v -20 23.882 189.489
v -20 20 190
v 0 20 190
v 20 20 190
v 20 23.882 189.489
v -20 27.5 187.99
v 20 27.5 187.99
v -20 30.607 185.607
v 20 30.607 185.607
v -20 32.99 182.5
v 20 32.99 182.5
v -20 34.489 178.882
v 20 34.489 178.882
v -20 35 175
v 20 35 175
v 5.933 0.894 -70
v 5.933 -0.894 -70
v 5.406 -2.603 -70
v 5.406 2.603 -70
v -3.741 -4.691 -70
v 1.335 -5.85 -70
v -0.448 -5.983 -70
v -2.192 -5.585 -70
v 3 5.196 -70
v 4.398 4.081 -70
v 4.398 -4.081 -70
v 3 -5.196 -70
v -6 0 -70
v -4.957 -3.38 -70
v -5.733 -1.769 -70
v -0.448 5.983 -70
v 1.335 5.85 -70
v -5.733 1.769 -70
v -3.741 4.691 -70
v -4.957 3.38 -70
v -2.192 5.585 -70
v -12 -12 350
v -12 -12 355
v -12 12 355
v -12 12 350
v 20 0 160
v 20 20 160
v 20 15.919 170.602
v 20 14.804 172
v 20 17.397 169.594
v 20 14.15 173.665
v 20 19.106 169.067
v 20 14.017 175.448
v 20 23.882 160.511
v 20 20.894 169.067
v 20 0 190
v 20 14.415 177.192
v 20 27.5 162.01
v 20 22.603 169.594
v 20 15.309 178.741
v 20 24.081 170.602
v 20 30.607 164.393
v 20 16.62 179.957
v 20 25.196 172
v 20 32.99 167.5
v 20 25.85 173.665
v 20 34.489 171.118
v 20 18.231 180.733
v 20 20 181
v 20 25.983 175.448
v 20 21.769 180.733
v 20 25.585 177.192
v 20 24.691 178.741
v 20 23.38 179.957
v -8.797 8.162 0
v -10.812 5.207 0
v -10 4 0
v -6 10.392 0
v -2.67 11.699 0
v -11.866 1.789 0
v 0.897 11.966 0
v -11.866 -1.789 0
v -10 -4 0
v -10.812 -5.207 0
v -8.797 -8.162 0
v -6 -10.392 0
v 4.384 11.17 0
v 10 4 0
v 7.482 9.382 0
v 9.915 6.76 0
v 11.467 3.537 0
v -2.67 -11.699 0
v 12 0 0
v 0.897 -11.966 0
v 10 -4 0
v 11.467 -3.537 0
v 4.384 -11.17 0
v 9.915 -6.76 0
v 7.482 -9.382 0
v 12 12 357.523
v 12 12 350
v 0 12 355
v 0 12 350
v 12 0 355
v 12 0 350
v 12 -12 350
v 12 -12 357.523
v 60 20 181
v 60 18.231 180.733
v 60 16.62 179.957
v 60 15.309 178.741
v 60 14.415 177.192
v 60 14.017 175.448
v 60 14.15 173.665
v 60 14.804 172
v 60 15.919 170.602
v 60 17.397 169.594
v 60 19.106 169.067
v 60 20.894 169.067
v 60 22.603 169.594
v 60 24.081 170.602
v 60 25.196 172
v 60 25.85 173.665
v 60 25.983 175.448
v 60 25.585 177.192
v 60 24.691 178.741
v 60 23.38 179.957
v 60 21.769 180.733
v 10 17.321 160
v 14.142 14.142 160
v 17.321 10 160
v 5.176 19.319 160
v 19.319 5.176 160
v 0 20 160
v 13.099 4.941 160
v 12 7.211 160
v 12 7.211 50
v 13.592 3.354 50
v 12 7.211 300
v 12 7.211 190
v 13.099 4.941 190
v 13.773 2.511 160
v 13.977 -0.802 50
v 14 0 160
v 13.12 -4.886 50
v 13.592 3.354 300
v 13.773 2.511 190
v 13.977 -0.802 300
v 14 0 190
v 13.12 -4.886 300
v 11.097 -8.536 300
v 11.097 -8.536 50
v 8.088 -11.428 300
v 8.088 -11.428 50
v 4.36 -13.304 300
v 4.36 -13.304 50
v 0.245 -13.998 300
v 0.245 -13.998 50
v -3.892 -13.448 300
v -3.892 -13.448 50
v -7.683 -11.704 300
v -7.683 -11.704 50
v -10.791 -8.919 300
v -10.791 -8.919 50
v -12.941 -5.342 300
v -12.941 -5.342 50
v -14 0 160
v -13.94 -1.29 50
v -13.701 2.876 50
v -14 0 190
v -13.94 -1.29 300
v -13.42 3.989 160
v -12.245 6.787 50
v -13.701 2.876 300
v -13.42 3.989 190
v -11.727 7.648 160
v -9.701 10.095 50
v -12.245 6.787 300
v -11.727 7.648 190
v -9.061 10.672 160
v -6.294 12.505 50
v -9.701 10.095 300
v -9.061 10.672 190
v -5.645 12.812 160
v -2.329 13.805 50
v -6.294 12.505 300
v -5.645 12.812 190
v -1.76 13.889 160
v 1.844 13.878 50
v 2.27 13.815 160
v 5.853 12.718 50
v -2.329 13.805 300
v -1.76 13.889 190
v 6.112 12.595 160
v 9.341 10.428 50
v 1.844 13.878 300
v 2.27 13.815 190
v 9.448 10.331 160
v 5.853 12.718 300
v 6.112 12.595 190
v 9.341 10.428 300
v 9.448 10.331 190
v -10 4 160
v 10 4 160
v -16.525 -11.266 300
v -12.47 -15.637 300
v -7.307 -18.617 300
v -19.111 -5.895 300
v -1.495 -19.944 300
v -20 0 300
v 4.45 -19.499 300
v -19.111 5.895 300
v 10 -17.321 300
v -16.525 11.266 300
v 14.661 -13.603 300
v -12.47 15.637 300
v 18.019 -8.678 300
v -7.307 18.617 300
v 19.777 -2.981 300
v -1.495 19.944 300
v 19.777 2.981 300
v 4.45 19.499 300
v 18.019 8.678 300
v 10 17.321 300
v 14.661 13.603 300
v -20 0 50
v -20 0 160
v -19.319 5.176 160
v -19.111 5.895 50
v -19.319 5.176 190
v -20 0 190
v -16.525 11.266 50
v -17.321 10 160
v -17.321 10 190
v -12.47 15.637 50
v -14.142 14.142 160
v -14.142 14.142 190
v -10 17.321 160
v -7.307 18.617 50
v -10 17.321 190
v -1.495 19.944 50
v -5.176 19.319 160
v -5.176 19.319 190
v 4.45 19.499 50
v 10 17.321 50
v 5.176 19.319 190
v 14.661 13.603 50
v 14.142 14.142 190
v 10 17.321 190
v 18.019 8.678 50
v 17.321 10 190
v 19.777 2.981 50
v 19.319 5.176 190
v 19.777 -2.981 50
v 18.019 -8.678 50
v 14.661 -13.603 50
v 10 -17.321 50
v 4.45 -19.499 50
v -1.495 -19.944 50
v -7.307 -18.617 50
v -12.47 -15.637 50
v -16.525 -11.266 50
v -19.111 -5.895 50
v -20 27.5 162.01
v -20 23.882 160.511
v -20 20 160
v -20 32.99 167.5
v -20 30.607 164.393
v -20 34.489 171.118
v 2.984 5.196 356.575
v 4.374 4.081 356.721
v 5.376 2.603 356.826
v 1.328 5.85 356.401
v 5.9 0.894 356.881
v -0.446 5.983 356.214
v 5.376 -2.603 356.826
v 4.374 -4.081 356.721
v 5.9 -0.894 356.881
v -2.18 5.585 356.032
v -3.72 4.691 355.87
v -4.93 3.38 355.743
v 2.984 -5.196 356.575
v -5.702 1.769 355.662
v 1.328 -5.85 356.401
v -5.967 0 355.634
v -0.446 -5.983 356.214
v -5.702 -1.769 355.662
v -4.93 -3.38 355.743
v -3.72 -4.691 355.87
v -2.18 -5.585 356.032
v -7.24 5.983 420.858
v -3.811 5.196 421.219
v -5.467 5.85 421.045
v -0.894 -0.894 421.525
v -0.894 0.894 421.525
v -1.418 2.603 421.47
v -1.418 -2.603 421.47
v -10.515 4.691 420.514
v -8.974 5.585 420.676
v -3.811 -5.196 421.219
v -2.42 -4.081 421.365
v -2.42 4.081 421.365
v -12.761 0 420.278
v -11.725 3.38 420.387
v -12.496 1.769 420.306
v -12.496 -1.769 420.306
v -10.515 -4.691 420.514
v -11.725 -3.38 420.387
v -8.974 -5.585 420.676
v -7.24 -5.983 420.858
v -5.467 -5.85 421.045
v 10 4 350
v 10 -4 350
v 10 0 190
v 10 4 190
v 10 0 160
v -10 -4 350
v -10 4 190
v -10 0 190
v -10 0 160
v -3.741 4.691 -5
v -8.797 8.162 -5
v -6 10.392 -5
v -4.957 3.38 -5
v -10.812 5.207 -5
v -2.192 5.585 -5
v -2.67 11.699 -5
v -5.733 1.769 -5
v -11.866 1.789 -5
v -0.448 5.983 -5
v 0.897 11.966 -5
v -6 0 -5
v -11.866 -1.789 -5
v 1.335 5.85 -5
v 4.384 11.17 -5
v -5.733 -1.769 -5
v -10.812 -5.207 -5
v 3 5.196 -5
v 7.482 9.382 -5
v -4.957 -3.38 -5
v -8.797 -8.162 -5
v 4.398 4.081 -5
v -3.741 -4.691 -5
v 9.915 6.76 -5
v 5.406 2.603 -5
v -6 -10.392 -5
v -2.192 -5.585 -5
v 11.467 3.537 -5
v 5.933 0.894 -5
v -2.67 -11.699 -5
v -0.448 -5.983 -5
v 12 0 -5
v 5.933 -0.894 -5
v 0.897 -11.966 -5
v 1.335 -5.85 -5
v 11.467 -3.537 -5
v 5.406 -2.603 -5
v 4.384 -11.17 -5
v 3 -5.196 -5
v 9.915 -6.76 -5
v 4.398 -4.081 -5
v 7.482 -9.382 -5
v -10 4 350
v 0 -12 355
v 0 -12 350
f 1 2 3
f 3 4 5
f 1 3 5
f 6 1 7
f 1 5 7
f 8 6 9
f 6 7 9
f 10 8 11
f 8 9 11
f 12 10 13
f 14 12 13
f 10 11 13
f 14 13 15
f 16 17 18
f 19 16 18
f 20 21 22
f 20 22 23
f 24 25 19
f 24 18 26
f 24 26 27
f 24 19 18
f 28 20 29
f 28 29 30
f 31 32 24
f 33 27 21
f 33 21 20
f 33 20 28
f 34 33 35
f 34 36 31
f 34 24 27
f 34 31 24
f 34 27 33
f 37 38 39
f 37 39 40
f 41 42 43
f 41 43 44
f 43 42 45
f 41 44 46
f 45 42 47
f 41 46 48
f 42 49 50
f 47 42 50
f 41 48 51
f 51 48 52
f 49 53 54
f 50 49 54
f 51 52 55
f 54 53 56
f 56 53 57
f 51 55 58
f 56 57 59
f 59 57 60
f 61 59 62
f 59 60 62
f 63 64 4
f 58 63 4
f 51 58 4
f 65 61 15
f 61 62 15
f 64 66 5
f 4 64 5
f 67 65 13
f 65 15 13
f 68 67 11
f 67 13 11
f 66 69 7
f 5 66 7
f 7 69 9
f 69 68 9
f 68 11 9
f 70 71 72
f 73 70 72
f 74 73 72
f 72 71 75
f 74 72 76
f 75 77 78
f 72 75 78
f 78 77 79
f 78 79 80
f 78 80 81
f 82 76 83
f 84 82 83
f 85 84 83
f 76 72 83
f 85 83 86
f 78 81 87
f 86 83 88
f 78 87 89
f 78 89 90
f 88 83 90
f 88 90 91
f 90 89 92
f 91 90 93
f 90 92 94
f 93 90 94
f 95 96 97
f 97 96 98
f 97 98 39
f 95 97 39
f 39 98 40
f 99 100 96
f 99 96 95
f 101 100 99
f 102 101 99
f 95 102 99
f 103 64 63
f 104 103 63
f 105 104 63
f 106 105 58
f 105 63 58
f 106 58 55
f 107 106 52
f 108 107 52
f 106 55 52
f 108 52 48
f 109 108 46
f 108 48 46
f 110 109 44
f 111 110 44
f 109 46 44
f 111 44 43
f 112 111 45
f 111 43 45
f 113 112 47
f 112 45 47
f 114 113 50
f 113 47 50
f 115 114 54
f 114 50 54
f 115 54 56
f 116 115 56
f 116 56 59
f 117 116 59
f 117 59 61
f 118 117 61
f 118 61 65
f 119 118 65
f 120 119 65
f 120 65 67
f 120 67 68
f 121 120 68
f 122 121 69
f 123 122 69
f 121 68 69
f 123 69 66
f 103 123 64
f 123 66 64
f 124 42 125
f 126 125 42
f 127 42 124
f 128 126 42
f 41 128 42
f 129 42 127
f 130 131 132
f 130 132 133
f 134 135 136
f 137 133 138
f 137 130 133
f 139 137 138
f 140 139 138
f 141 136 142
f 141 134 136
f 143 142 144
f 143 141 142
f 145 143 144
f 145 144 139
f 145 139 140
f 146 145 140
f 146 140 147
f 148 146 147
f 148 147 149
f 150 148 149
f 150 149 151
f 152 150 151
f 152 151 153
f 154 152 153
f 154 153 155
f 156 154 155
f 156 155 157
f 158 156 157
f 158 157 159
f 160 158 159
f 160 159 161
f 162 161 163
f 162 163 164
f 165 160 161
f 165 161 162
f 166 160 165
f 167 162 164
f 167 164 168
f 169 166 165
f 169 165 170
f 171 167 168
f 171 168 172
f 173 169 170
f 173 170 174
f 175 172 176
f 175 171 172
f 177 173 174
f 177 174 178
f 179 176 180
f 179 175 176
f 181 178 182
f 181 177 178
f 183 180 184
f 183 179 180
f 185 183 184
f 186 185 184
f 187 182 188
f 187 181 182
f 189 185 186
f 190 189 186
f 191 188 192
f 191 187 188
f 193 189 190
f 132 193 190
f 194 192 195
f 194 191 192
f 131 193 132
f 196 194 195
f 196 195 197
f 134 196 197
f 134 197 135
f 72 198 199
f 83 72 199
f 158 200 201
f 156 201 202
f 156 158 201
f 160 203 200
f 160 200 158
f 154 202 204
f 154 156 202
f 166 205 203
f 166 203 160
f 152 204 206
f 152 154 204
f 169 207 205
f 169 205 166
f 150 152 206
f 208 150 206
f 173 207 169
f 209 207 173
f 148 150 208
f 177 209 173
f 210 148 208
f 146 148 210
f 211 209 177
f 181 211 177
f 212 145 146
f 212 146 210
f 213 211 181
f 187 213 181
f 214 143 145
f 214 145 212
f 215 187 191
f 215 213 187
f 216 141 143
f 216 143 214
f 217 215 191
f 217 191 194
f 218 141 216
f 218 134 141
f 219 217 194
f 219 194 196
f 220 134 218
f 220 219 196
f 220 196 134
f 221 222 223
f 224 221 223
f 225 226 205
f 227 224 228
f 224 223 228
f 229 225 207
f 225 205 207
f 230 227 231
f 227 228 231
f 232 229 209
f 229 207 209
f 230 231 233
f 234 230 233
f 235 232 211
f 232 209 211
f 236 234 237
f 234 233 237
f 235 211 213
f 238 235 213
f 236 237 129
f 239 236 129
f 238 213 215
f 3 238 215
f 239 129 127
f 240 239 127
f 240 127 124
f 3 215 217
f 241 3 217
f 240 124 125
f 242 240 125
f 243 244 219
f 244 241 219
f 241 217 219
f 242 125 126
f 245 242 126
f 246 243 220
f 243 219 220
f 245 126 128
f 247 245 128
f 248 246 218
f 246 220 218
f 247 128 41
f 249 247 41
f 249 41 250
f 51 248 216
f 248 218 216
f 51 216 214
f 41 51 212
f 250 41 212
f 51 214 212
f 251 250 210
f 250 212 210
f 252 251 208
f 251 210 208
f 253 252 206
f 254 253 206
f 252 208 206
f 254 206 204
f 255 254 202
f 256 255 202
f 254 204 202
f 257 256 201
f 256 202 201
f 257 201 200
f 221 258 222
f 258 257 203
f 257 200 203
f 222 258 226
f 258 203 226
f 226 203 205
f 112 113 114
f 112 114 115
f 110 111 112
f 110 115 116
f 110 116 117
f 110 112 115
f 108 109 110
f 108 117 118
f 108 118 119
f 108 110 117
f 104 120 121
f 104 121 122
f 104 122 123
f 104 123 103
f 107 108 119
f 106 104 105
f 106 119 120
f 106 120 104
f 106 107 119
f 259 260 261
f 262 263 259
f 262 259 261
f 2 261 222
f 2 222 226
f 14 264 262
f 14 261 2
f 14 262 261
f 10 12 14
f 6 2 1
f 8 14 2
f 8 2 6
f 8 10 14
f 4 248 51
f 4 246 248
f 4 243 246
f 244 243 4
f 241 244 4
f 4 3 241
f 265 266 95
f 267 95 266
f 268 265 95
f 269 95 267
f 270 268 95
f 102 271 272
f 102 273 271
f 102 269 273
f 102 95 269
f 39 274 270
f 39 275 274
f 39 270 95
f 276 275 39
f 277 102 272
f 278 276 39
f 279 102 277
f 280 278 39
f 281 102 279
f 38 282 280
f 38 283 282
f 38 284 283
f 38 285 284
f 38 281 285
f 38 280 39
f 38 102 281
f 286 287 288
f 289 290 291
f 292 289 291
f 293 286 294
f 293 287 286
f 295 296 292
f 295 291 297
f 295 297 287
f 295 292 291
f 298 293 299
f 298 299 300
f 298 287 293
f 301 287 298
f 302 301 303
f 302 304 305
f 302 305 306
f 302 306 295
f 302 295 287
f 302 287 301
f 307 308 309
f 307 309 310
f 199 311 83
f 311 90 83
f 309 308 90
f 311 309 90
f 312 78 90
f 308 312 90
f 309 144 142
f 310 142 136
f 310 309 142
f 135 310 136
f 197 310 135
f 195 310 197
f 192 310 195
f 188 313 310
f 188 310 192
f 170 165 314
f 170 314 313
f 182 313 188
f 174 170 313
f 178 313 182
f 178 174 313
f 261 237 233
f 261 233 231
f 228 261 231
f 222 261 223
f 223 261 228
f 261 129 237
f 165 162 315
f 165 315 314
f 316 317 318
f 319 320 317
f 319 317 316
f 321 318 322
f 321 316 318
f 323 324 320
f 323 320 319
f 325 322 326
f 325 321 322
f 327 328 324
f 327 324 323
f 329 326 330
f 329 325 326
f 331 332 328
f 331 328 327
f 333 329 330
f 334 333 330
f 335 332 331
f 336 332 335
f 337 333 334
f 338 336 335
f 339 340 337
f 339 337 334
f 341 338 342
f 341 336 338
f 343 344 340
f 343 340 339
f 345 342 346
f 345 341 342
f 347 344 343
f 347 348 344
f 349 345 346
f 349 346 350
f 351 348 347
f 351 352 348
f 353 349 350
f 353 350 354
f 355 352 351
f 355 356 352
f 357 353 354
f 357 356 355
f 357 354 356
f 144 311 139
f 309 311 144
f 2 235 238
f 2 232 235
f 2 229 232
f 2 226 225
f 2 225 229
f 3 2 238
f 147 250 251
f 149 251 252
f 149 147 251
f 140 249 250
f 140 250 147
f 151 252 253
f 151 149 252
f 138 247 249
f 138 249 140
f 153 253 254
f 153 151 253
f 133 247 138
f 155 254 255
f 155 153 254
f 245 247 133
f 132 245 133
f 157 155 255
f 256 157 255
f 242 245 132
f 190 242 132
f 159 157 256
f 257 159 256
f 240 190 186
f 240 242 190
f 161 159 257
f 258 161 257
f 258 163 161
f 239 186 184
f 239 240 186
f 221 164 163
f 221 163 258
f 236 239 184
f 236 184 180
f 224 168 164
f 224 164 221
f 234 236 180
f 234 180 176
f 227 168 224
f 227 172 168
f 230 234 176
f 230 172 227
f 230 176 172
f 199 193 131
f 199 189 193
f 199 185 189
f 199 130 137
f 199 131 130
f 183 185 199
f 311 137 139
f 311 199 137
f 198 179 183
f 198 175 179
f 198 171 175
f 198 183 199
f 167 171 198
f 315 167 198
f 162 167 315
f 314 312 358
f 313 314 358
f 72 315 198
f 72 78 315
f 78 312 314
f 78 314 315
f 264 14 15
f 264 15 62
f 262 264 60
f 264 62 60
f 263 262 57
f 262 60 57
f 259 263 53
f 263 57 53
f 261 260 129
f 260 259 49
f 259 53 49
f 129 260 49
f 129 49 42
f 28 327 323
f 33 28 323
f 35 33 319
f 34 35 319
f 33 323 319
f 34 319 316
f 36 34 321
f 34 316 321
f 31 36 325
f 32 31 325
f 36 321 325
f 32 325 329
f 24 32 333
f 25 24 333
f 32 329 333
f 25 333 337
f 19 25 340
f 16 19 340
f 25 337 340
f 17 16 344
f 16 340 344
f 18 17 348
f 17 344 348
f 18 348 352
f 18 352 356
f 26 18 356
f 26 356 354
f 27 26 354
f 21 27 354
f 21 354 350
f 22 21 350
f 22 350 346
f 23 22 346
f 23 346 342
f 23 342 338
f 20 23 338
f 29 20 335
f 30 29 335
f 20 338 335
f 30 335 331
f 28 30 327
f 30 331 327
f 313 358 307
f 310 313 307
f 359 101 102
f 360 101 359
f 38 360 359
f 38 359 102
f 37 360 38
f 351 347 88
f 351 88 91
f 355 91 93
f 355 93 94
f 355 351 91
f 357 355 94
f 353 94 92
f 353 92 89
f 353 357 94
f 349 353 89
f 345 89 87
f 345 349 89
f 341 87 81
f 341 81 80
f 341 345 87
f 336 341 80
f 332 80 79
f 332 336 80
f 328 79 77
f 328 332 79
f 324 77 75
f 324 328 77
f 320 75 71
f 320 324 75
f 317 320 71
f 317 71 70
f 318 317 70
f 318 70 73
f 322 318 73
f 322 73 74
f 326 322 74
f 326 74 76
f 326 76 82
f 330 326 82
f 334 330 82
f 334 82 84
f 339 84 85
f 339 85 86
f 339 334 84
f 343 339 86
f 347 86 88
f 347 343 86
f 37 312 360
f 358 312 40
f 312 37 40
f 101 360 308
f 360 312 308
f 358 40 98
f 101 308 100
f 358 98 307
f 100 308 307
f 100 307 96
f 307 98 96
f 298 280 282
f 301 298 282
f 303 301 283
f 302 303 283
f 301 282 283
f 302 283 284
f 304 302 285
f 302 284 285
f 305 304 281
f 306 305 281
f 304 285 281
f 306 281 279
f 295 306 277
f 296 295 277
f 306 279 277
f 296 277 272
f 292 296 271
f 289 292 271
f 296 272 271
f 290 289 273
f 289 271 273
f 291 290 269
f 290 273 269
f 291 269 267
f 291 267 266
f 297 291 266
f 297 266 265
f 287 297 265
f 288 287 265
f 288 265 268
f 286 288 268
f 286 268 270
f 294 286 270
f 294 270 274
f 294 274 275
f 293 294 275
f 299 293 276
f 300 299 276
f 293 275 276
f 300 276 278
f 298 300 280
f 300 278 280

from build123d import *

# Parameters (mm, degrees)
SZKIC1_W                         = 20
SZKIC1_H                         = 8
DODANIE_WYCI_GNI_CIE1_DEPTH      = 350
SZKIC2_R                         = 12
DODANIE_WYCI_GNI_CIE2_DEPTH      = 5
DODANIE_WYCI_GNI_CIE3_START      = 5
SZKIC3_R                         = 12
DODANIE_WYCI_GNI_CIE3_DEPTH      = 5
DODANIE_WYCI_GNI_CIE4_DEPTH      = 8
DODANIE_WYCI_GNI_CIE4_DEPTH_BACK = 16
SZKIC6_R                         = 6
DODANIE_WYCI_GNI_CIE5_DEPTH      = 65
SZKIC7_R                         = 6
DODANIE_WYCI_GNI_CIE6_DEPTH      = 65
SZKIC8_R                         = 20
SZKIC8_R_2                       = 14
DODANIE_WYCI_GNI_CIE7_DEPTH      = 300
SZKIC13_R                        = 20
SZKIC13_R_2                      = 14
WYTNIJ_WYCI_GNI_CIE1_DEPTH       = 50
DODANIE_WYCI_GNI_CIE9_DEPTH      = 20
DODANIE_WYCI_GNI_CIE9_DEPTH_BACK = 20
WYTNIJ_WYCI_GNI_CIE2_DEPTH       = 40
SZKIC16_R                        = 6
DODANIE_WYCI_GNI_CIE10_DEPTH     = 40


with BuildPart() as part:
    # Szkic1 → Dodanie-wyciągnięcie1 (new body)
    with BuildSketch(Plane.XY):
        Rectangle(SZKIC1_W, SZKIC1_H)
    extrude(amount=DODANIE_WYCI_GNI_CIE1_DEPTH)

    # Szkic2 → Dodanie-wyciągnięcie2 (add)
    with BuildSketch(Plane.XY.offset(350)):
        Circle(SZKIC2_R)
    extrude(amount=DODANIE_WYCI_GNI_CIE2_DEPTH)

    # Szkic3 → Dodanie-wyciągnięcie3 (add)
    with BuildSketch(Plane(origin=(0, 0, 0), x_dir=(-1, 0, 0), z_dir=(0, 0, -1)).offset(DODANIE_WYCI_GNI_CIE3_START)):
        with Locations(Location((0, 0, 0), (0, 0, 180))):
            Circle(SZKIC3_R)
    extrude(amount=-DODANIE_WYCI_GNI_CIE3_DEPTH)

    # Szkic5 → Dodanie-wyciągnięcie4 (add, two sides: drawn at the far end of the back side and taken through both)
    with BuildSketch(Plane(origin=(0, 4, 0), x_dir=(1, 0, 0), z_dir=(0, 1, 0)).offset(-DODANIE_WYCI_GNI_CIE4_DEPTH_BACK)):
        Polygon((-12, -350), (12, -350), (12, -357.522501646), (-12, -355), align=None)
    extrude(amount=DODANIE_WYCI_GNI_CIE4_DEPTH + DODANIE_WYCI_GNI_CIE4_DEPTH_BACK)

    # Szkic6 → Dodanie-wyciągnięcie5 (add)
    with BuildSketch(Plane(origin=(-37.035439516, 0, 352.368669275), x_dir=(0.9945218953682733, 0, 0.1045284632676537), z_dir=(-0.1045284632676537, 0, 0.9945218953682733))):
        with Locations(Location((37.23944107, 0, 0), (0, 0, 180))):
            Circle(SZKIC6_R)
    extrude(amount=DODANIE_WYCI_GNI_CIE5_DEPTH)

    # Szkic7 → Dodanie-wyciągnięcie6 (add)
    with BuildSketch(Plane(origin=(0, 0, -5), x_dir=(-1, 0, 0), z_dir=(0, 0, -1))):
        Circle(SZKIC7_R)
    extrude(amount=DODANIE_WYCI_GNI_CIE6_DEPTH)

    # Szkic8 → Dodanie-wyciągnięcie7 (add)
    with BuildSketch(Plane(origin=(0, 0, 350), x_dir=(-1, 0, 0), z_dir=(0, 0, -1))):
        Circle(SZKIC8_R)
        with Locations(Location((0, 0, 0), (0, 0, 148.997280866))):
            Circle(SZKIC8_R_2, mode=Mode.SUBTRACT)
    extrude(amount=DODANIE_WYCI_GNI_CIE7_DEPTH)

    # Szkic13 → Wytnij-wyciągnięcie1 (cut)
    with BuildSketch(Plane.XY.offset(350)):
        Circle(SZKIC13_R)
        Circle(SZKIC13_R_2, mode=Mode.SUBTRACT)
    extrude(amount=-WYTNIJ_WYCI_GNI_CIE1_DEPTH, mode=Mode.SUBTRACT)


with BuildPart() as wytnij_wyci_gni_cie1_piece_1:
    # of the separate pieces the step leaves, piece 1, a body of its own (wytnij_wyci_gni_cie1_pieces)
    add(part.part.solids().sort_by_distance((12, 7.211102551, 300))[0])



with BuildPart() as wytnij_wyci_gni_cie1_piece_2:
    # of the separate pieces the step leaves, piece 2, a body of its own (wytnij_wyci_gni_cie1_pieces)
    add(part.part.solids().sort_by_distance((12, 0, -5))[0])


with BuildPart() as wytnij_wyci_gni_cie1_piece_1_1:
    add(wytnij_wyci_gni_cie1_piece_1.part)

    add(wytnij_wyci_gni_cie1_piece_2.part)  # Dodanie-wyciągnięcie9 merges Wytnij-wyciągnięcie1 piece 2
    # Szkic14 → Dodanie-wyciągnięcie9 (add, two sides: drawn at the far end of the back side and taken through both)
    with BuildSketch(Plane(origin=(0, 0, 0), x_dir=(0, 0, -1), z_dir=(1, 0, 0)).offset(-DODANIE_WYCI_GNI_CIE9_DEPTH_BACK)):
        Polygon((-175, 35), (-160, 35), (-160, 0), (-190, 0), (-190, 35), align=None)
    extrude(amount=DODANIE_WYCI_GNI_CIE9_DEPTH + DODANIE_WYCI_GNI_CIE9_DEPTH_BACK)

    # Szkic15 → Wytnij-wyciągnięcie2 (cut)
    with BuildSketch(Plane(origin=(20, 0, 0), x_dir=(0, 0, -1), z_dir=(1, 0, 0))):
        with BuildLine():
            Line((-190, 35), (-190, 20))
            ThreePointArc((-190, 20), (-185.606601718, 30.606601718), (-175, 35))
            Line((-175, 35), (-190, 35))
        make_face()
        with BuildLine():
            ThreePointArc((-175, 35), (-164.393398282, 30.606601718), (-160, 20))
            Line((-160, 20), (-160, 35))
            Line((-160, 35), (-175, 35))
        make_face()
    extrude(amount=-WYTNIJ_WYCI_GNI_CIE2_DEPTH, mode=Mode.SUBTRACT)

    # Szkic16 → Dodanie-wyciągnięcie10 (add)
    with BuildSketch(Plane(origin=(20, 0, 0), x_dir=(0, 0, -1), z_dir=(1, 0, 0))):
        with Locations(Location((-175, 20, 0), (0, 0, 180))):
            Circle(SZKIC16_R)
    extrude(amount=DODANIE_WYCI_GNI_CIE10_DEPTH)


solid = wytnij_wyci_gni_cie1_piece_1_1.part
